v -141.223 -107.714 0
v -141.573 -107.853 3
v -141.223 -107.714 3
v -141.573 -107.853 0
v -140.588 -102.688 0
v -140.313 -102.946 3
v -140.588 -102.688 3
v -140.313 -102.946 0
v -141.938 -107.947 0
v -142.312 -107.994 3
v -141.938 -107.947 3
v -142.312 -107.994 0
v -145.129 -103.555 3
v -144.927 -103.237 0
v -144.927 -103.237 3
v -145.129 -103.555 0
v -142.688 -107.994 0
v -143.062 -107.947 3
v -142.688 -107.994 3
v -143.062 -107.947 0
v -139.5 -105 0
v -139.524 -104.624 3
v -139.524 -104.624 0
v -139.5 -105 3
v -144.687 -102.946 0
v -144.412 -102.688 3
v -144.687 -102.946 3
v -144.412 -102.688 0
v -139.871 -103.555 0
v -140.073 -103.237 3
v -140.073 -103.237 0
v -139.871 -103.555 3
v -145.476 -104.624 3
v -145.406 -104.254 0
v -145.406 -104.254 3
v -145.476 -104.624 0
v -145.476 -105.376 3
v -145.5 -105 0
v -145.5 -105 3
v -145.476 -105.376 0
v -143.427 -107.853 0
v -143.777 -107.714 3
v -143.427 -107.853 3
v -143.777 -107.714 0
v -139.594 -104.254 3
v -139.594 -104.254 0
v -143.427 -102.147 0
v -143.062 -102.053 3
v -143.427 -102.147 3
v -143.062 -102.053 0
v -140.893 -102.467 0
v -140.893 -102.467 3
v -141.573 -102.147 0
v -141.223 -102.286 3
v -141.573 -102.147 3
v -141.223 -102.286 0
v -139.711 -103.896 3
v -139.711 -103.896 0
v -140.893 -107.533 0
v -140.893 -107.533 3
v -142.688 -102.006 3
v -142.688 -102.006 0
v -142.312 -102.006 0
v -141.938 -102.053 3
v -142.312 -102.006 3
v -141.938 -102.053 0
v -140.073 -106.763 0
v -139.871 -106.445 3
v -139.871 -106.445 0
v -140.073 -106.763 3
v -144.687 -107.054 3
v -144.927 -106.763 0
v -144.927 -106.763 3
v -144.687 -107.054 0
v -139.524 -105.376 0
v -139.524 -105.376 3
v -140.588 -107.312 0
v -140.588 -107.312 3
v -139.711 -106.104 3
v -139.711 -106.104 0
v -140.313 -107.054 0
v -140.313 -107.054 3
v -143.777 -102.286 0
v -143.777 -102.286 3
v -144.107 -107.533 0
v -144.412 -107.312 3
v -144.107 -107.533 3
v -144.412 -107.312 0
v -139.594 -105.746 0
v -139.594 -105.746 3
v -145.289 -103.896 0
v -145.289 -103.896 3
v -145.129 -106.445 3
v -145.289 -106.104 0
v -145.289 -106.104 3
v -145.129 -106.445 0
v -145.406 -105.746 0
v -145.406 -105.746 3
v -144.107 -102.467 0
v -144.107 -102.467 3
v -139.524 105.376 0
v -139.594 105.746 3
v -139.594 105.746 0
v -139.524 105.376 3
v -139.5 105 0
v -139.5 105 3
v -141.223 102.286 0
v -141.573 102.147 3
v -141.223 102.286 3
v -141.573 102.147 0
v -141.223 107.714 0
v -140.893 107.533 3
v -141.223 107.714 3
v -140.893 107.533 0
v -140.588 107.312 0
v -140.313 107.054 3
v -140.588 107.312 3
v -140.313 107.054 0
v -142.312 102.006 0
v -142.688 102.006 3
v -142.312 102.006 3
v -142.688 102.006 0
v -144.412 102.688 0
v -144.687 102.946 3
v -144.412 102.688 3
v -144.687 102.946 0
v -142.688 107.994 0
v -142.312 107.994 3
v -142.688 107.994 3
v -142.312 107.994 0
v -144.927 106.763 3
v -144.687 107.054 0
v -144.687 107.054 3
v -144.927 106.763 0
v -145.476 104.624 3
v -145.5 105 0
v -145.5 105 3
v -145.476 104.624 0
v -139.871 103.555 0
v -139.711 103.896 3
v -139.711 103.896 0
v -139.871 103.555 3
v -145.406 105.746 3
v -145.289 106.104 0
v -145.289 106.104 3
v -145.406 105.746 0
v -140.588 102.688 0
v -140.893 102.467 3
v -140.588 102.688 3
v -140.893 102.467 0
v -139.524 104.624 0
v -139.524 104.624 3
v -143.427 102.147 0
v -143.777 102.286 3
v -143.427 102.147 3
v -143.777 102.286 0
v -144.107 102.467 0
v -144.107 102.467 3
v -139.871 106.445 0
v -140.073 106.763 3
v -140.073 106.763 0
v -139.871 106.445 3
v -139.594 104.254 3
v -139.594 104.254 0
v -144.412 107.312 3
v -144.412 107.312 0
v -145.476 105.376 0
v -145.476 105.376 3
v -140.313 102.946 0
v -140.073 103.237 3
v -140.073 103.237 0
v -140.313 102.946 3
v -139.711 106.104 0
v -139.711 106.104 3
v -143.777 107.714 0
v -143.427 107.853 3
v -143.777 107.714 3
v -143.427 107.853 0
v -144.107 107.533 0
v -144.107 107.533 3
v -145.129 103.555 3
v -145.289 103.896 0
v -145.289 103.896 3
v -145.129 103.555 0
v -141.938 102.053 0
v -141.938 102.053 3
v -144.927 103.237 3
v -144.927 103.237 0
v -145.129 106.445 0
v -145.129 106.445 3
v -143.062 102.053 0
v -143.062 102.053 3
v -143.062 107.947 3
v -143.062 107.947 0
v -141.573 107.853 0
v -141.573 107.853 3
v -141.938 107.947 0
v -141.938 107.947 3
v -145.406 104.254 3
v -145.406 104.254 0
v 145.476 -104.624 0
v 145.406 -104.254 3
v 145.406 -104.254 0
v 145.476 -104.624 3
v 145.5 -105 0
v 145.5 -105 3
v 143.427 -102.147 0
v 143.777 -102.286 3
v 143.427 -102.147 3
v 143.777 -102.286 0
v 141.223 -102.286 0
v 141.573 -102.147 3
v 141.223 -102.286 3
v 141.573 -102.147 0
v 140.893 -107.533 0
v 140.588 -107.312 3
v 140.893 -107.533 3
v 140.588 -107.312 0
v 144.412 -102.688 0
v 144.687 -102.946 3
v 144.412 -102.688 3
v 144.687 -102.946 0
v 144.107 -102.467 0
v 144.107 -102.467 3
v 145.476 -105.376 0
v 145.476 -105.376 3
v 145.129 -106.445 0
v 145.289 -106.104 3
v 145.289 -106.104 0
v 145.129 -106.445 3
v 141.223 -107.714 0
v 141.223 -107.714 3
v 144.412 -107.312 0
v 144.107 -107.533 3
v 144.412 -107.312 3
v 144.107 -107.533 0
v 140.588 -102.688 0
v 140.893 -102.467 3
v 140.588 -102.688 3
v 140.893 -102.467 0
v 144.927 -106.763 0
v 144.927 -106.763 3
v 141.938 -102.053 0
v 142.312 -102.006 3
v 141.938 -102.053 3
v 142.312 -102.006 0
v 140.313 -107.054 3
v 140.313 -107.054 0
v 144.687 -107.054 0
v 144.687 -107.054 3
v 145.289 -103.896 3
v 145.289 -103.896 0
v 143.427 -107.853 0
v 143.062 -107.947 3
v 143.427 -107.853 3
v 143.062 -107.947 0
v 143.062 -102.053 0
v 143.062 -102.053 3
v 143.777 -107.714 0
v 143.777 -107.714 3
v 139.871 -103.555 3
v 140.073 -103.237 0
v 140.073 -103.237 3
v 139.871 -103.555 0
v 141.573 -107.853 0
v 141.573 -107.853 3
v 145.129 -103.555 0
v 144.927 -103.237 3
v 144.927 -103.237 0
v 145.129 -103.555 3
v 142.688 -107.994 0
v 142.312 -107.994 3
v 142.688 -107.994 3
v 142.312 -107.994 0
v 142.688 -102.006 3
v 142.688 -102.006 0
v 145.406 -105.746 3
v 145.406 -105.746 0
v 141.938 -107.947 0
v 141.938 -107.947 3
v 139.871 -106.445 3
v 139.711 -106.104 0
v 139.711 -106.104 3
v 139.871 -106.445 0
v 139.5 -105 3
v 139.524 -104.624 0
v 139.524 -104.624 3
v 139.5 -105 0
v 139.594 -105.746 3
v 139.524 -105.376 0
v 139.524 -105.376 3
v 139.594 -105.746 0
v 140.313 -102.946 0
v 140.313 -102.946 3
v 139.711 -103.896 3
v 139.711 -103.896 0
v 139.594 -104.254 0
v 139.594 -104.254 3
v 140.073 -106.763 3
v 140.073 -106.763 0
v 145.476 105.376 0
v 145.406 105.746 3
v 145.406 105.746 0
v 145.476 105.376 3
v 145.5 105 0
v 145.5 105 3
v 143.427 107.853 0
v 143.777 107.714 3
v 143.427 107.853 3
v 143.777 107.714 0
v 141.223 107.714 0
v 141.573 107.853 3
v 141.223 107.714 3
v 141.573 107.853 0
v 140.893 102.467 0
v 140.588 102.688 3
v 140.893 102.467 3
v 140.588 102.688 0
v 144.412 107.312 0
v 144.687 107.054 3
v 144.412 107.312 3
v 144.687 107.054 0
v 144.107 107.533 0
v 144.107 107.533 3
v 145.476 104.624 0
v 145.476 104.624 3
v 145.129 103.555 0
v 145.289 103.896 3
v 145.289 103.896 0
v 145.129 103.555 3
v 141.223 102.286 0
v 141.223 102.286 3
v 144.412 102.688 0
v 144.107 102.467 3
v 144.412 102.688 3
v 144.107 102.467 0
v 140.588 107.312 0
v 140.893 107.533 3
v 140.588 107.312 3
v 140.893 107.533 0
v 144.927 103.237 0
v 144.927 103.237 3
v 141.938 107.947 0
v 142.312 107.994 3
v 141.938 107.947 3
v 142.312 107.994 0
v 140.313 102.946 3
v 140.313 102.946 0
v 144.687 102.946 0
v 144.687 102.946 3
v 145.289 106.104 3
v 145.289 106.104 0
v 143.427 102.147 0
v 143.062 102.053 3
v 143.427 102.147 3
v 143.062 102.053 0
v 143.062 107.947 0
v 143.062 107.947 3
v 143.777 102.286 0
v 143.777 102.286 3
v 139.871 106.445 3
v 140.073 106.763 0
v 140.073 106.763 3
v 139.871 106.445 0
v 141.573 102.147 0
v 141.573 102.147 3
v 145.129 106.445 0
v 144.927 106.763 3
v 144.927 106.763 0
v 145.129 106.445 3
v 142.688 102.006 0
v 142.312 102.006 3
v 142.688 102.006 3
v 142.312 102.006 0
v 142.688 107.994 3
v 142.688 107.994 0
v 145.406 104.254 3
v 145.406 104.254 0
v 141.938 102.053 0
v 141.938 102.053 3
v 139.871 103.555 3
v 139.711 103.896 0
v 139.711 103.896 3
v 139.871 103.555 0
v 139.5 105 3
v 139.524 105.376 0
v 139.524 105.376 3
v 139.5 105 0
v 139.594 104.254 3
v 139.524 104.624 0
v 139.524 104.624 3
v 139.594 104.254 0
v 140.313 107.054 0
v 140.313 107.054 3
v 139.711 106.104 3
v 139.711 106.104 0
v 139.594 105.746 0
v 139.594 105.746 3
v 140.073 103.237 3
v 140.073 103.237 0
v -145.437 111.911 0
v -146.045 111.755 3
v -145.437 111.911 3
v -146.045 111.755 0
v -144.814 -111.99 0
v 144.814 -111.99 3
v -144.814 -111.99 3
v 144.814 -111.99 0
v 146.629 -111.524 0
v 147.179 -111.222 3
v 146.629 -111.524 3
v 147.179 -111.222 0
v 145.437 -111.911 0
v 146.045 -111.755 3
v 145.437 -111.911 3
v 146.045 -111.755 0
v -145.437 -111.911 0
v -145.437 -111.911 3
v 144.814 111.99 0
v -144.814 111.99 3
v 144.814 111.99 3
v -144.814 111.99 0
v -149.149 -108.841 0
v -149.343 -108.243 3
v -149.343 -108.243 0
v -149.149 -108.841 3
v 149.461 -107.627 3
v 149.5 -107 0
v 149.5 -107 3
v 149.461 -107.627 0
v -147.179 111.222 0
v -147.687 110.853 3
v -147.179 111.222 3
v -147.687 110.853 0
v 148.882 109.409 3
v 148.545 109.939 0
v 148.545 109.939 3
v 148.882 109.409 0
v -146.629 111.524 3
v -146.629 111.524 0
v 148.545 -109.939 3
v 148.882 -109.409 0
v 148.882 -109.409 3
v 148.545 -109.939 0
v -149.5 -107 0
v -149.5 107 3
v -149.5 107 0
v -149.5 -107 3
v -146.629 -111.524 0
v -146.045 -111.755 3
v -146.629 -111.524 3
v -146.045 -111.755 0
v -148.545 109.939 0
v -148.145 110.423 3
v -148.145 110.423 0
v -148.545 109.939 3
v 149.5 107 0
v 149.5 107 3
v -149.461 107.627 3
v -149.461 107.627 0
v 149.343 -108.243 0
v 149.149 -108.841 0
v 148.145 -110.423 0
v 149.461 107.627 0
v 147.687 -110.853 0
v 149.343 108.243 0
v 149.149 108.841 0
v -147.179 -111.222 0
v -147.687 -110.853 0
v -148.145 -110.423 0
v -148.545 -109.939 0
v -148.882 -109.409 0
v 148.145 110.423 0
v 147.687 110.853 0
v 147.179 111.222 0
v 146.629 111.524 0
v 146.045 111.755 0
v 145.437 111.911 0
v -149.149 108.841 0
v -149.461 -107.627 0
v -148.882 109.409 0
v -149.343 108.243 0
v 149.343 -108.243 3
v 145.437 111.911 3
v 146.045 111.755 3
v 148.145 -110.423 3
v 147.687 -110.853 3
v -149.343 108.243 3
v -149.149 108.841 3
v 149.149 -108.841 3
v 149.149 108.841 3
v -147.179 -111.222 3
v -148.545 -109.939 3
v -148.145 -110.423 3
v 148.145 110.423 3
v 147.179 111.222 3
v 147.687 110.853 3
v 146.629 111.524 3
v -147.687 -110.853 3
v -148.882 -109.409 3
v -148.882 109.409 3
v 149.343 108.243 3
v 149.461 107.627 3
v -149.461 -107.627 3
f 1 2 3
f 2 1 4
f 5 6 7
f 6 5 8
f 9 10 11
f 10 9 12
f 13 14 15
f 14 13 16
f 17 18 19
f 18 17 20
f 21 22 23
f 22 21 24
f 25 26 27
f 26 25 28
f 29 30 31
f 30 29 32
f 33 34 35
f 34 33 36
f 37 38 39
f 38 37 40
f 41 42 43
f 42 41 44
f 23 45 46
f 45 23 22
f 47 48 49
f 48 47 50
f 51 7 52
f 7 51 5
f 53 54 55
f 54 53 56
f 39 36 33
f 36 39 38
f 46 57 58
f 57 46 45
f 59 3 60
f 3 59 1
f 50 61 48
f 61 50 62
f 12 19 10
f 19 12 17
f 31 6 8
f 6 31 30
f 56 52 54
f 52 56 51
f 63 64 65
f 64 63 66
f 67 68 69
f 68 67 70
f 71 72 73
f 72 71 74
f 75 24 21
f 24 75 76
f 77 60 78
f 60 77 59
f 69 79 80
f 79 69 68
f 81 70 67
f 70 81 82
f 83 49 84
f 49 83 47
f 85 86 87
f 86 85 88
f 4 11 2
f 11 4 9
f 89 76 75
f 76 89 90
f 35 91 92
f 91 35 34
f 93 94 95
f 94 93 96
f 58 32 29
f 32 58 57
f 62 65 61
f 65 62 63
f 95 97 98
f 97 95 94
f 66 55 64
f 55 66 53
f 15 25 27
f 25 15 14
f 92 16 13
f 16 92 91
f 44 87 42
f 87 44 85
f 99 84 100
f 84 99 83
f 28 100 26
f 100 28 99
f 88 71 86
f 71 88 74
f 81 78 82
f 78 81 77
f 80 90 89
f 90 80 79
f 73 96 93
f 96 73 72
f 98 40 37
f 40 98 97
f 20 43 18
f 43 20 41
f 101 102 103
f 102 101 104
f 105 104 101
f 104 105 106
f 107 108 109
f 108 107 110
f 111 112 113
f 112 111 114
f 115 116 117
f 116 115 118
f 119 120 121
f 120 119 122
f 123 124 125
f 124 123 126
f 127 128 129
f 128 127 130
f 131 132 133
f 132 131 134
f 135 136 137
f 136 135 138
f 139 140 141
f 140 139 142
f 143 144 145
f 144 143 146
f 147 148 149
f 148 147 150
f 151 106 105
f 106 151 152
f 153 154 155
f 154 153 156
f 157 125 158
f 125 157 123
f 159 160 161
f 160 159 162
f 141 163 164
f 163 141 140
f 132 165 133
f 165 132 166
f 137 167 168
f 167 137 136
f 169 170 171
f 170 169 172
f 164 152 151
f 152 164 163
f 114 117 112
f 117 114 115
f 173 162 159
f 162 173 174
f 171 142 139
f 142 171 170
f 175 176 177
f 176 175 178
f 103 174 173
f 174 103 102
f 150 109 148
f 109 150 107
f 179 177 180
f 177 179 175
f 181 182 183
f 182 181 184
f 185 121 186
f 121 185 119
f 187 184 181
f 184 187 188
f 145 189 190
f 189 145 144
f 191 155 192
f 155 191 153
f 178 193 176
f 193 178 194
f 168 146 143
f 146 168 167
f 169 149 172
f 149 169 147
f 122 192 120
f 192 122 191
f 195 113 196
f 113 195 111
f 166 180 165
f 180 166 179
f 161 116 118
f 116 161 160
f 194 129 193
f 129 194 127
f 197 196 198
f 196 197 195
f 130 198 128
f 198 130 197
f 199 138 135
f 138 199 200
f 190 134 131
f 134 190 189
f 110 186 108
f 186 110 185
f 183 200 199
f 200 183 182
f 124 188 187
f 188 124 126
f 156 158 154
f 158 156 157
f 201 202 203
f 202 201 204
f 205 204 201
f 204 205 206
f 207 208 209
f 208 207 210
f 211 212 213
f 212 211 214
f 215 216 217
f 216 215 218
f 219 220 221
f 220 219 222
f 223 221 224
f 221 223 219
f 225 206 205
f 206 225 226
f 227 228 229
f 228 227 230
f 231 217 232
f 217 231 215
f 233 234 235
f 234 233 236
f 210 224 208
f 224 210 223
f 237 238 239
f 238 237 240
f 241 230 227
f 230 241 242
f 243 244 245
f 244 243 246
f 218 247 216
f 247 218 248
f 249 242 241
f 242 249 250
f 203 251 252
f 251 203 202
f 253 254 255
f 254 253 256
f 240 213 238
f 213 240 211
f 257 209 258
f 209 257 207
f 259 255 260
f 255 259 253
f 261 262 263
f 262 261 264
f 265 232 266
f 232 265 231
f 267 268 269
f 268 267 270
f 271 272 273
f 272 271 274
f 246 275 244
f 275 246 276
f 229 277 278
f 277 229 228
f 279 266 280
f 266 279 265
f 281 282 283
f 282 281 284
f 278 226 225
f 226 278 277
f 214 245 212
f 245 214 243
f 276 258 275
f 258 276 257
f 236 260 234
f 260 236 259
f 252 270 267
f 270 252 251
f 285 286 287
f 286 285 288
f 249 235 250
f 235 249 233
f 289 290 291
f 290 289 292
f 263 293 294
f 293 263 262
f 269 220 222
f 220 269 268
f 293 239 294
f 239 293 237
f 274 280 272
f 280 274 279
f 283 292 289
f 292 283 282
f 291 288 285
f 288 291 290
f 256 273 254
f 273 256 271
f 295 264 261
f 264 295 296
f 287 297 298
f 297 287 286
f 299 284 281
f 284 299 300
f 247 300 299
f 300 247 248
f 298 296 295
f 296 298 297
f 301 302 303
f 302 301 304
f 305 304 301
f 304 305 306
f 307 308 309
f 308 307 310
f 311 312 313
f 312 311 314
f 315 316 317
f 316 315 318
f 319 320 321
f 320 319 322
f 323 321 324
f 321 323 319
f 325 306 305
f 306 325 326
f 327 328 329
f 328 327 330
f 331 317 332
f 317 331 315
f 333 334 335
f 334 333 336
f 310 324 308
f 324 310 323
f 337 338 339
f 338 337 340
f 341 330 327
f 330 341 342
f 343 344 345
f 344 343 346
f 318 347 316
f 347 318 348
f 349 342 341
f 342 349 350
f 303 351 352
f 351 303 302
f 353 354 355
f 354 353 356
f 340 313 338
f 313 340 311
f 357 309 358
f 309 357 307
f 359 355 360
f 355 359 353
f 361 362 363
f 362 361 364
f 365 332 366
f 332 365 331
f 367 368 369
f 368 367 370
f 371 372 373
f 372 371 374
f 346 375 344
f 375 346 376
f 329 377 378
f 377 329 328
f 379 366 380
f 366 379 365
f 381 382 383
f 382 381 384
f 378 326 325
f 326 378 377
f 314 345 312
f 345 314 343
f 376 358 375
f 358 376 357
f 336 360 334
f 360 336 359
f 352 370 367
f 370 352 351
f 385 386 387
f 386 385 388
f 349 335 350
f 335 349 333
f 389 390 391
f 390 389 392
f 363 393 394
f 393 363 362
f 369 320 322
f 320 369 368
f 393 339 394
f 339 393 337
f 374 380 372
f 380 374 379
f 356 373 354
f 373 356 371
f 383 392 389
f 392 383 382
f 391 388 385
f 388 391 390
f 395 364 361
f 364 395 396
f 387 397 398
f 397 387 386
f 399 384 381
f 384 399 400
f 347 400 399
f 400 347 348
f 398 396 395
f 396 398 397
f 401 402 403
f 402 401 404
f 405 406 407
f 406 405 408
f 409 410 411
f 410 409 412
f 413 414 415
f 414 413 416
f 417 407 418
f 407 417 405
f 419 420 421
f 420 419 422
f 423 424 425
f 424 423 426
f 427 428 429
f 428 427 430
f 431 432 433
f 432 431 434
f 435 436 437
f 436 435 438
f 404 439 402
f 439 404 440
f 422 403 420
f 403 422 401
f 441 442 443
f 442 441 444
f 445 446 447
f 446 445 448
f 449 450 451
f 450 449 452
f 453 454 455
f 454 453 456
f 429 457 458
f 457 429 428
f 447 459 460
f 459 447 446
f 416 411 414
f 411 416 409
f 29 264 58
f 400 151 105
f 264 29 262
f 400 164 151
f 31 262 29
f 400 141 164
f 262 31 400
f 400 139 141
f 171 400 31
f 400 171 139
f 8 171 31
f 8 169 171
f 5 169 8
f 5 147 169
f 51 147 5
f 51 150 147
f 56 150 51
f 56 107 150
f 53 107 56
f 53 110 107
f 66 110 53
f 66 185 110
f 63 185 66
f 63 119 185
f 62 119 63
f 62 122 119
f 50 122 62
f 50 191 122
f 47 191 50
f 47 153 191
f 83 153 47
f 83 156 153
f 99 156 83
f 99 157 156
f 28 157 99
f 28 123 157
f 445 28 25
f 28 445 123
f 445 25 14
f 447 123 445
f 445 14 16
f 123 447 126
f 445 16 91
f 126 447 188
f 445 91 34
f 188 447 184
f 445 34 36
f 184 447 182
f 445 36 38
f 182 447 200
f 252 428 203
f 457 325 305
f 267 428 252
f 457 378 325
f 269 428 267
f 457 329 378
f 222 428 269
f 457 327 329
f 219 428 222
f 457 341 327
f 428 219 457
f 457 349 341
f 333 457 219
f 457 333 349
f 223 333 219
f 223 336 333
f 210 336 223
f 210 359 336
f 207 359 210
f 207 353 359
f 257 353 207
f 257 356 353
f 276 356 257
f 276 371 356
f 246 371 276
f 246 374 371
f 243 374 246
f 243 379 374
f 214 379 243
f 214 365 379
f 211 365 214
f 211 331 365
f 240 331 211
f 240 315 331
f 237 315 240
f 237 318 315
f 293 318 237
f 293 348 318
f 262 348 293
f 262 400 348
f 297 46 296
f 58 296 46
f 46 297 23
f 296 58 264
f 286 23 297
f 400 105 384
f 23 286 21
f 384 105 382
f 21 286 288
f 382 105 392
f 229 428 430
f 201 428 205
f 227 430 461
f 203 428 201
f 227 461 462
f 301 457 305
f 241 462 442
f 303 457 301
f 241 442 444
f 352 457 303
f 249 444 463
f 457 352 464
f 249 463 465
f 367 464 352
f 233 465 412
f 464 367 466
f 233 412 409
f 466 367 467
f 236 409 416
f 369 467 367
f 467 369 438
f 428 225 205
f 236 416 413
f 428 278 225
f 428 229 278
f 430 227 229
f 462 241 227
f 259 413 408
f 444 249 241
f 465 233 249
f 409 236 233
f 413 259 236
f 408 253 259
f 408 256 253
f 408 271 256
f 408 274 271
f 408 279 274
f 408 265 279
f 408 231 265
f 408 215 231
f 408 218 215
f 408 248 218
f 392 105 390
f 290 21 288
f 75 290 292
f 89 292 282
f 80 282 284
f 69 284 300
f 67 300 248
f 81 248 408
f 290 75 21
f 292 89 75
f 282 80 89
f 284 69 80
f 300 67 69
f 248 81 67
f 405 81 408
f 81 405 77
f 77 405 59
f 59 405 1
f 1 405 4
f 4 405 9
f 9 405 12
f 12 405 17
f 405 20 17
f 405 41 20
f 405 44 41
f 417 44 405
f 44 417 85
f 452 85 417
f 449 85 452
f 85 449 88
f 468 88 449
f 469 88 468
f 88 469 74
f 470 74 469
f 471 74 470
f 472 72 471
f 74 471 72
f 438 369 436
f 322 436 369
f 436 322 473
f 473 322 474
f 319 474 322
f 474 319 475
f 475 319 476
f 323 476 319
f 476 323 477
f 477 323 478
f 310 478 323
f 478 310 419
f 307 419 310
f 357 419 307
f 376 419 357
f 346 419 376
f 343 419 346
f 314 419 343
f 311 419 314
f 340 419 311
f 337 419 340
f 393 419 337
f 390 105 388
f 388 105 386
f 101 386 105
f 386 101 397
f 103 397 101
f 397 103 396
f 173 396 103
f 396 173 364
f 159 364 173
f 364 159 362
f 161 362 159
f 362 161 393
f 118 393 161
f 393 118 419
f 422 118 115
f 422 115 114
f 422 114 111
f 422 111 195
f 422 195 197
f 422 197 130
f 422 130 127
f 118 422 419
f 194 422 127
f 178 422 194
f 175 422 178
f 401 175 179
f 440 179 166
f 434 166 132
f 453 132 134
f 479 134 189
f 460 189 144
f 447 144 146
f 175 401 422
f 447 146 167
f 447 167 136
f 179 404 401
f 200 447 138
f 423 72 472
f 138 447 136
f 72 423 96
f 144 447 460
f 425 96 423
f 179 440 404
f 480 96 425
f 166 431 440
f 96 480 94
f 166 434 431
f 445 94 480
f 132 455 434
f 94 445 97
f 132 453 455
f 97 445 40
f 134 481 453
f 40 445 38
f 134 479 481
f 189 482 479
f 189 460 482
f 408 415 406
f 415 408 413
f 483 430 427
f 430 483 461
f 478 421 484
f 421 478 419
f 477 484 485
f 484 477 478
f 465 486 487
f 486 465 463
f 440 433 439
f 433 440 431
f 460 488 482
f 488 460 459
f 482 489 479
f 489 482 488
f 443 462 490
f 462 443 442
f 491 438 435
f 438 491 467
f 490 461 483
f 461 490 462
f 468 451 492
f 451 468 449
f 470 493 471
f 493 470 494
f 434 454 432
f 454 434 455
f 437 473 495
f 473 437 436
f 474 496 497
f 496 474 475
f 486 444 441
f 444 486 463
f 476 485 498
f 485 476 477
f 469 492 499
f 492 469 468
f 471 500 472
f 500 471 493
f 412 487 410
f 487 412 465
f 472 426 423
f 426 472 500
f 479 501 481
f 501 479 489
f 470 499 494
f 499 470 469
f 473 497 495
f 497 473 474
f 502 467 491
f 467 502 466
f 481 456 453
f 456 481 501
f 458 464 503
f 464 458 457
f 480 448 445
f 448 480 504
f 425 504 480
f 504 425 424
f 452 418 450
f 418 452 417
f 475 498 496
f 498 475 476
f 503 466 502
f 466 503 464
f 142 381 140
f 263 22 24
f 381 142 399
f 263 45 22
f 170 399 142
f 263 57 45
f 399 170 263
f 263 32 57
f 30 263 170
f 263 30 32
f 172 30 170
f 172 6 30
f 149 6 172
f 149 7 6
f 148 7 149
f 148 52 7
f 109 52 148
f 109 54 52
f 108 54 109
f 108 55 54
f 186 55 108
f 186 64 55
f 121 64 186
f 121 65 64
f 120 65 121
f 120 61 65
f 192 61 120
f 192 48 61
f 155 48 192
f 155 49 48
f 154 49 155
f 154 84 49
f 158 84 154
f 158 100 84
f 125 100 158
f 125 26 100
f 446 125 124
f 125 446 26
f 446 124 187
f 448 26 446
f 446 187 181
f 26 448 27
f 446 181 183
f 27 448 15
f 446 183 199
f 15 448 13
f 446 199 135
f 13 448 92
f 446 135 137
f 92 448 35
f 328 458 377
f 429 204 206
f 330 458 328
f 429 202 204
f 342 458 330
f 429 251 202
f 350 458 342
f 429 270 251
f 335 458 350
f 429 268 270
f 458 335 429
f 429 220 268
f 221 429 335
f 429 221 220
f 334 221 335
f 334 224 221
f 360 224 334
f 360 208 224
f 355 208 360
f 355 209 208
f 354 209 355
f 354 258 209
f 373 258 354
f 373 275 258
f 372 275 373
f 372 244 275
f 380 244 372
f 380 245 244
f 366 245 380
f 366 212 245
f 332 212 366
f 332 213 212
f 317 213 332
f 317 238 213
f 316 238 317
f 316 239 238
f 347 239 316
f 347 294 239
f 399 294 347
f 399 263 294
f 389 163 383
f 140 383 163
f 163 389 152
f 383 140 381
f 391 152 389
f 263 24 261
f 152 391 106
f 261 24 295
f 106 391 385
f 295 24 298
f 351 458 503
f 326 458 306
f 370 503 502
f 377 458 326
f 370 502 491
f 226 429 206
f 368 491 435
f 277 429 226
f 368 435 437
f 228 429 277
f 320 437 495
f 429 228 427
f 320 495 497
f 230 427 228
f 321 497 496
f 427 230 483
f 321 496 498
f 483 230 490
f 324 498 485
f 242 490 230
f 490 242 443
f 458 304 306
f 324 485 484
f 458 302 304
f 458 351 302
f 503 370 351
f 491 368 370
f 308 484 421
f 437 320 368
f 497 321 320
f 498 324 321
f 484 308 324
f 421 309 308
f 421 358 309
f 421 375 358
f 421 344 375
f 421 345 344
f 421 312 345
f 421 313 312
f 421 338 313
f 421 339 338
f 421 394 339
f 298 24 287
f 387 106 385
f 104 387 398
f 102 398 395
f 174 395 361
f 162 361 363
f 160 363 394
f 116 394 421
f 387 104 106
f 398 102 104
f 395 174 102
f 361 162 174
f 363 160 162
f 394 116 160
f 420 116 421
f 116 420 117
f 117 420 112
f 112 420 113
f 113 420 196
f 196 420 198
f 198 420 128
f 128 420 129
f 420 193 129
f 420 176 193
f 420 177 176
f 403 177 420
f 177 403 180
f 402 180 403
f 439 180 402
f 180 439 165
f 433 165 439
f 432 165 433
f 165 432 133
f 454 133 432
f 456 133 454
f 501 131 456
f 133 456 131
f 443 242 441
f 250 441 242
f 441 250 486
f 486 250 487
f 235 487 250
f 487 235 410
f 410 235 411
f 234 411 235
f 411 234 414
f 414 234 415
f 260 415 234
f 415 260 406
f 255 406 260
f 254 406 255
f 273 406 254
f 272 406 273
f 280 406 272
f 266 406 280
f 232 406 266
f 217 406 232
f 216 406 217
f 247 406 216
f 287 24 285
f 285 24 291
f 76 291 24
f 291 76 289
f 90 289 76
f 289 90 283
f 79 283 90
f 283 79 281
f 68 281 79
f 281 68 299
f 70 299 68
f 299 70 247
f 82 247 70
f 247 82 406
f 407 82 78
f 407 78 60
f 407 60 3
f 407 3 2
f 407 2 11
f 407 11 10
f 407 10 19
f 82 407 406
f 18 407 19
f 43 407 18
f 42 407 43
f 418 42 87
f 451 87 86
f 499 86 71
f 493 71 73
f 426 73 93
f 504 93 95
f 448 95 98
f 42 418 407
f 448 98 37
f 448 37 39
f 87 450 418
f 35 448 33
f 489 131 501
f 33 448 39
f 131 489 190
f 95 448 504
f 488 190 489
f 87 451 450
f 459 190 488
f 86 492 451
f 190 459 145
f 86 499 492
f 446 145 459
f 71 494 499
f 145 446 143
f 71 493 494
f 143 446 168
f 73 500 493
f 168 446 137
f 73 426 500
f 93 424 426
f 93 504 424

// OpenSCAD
$fn = 50;


difference() {
	union() {
		hull() {
			translate(v = [-144.5000000000, 107.0000000000, 0]) {
				cylinder(h = 3, r = 5);
			}
			translate(v = [144.5000000000, 107.0000000000, 0]) {
				cylinder(h = 3, r = 5);
			}
			translate(v = [-144.5000000000, -107.0000000000, 0]) {
				cylinder(h = 3, r = 5);
			}
			translate(v = [144.5000000000, -107.0000000000, 0]) {
				cylinder(h = 3, r = 5);
			}
		}
	}
	union() {
		translate(v = [-142.5000000000, -105.0000000000, -100.0000000000]) {
			cylinder(h = 200, r = 3.0000000000);
		}
		translate(v = [-142.5000000000, 105.0000000000, -100.0000000000]) {
			cylinder(h = 200, r = 3.0000000000);
		}
		translate(v = [142.5000000000, -105.0000000000, -100.0000000000]) {
			cylinder(h = 200, r = 3.0000000000);
		}
		translate(v = [142.5000000000, 105.0000000000, -100.0000000000]) {
			cylinder(h = 200, r = 3.0000000000);
		}
	}
}
